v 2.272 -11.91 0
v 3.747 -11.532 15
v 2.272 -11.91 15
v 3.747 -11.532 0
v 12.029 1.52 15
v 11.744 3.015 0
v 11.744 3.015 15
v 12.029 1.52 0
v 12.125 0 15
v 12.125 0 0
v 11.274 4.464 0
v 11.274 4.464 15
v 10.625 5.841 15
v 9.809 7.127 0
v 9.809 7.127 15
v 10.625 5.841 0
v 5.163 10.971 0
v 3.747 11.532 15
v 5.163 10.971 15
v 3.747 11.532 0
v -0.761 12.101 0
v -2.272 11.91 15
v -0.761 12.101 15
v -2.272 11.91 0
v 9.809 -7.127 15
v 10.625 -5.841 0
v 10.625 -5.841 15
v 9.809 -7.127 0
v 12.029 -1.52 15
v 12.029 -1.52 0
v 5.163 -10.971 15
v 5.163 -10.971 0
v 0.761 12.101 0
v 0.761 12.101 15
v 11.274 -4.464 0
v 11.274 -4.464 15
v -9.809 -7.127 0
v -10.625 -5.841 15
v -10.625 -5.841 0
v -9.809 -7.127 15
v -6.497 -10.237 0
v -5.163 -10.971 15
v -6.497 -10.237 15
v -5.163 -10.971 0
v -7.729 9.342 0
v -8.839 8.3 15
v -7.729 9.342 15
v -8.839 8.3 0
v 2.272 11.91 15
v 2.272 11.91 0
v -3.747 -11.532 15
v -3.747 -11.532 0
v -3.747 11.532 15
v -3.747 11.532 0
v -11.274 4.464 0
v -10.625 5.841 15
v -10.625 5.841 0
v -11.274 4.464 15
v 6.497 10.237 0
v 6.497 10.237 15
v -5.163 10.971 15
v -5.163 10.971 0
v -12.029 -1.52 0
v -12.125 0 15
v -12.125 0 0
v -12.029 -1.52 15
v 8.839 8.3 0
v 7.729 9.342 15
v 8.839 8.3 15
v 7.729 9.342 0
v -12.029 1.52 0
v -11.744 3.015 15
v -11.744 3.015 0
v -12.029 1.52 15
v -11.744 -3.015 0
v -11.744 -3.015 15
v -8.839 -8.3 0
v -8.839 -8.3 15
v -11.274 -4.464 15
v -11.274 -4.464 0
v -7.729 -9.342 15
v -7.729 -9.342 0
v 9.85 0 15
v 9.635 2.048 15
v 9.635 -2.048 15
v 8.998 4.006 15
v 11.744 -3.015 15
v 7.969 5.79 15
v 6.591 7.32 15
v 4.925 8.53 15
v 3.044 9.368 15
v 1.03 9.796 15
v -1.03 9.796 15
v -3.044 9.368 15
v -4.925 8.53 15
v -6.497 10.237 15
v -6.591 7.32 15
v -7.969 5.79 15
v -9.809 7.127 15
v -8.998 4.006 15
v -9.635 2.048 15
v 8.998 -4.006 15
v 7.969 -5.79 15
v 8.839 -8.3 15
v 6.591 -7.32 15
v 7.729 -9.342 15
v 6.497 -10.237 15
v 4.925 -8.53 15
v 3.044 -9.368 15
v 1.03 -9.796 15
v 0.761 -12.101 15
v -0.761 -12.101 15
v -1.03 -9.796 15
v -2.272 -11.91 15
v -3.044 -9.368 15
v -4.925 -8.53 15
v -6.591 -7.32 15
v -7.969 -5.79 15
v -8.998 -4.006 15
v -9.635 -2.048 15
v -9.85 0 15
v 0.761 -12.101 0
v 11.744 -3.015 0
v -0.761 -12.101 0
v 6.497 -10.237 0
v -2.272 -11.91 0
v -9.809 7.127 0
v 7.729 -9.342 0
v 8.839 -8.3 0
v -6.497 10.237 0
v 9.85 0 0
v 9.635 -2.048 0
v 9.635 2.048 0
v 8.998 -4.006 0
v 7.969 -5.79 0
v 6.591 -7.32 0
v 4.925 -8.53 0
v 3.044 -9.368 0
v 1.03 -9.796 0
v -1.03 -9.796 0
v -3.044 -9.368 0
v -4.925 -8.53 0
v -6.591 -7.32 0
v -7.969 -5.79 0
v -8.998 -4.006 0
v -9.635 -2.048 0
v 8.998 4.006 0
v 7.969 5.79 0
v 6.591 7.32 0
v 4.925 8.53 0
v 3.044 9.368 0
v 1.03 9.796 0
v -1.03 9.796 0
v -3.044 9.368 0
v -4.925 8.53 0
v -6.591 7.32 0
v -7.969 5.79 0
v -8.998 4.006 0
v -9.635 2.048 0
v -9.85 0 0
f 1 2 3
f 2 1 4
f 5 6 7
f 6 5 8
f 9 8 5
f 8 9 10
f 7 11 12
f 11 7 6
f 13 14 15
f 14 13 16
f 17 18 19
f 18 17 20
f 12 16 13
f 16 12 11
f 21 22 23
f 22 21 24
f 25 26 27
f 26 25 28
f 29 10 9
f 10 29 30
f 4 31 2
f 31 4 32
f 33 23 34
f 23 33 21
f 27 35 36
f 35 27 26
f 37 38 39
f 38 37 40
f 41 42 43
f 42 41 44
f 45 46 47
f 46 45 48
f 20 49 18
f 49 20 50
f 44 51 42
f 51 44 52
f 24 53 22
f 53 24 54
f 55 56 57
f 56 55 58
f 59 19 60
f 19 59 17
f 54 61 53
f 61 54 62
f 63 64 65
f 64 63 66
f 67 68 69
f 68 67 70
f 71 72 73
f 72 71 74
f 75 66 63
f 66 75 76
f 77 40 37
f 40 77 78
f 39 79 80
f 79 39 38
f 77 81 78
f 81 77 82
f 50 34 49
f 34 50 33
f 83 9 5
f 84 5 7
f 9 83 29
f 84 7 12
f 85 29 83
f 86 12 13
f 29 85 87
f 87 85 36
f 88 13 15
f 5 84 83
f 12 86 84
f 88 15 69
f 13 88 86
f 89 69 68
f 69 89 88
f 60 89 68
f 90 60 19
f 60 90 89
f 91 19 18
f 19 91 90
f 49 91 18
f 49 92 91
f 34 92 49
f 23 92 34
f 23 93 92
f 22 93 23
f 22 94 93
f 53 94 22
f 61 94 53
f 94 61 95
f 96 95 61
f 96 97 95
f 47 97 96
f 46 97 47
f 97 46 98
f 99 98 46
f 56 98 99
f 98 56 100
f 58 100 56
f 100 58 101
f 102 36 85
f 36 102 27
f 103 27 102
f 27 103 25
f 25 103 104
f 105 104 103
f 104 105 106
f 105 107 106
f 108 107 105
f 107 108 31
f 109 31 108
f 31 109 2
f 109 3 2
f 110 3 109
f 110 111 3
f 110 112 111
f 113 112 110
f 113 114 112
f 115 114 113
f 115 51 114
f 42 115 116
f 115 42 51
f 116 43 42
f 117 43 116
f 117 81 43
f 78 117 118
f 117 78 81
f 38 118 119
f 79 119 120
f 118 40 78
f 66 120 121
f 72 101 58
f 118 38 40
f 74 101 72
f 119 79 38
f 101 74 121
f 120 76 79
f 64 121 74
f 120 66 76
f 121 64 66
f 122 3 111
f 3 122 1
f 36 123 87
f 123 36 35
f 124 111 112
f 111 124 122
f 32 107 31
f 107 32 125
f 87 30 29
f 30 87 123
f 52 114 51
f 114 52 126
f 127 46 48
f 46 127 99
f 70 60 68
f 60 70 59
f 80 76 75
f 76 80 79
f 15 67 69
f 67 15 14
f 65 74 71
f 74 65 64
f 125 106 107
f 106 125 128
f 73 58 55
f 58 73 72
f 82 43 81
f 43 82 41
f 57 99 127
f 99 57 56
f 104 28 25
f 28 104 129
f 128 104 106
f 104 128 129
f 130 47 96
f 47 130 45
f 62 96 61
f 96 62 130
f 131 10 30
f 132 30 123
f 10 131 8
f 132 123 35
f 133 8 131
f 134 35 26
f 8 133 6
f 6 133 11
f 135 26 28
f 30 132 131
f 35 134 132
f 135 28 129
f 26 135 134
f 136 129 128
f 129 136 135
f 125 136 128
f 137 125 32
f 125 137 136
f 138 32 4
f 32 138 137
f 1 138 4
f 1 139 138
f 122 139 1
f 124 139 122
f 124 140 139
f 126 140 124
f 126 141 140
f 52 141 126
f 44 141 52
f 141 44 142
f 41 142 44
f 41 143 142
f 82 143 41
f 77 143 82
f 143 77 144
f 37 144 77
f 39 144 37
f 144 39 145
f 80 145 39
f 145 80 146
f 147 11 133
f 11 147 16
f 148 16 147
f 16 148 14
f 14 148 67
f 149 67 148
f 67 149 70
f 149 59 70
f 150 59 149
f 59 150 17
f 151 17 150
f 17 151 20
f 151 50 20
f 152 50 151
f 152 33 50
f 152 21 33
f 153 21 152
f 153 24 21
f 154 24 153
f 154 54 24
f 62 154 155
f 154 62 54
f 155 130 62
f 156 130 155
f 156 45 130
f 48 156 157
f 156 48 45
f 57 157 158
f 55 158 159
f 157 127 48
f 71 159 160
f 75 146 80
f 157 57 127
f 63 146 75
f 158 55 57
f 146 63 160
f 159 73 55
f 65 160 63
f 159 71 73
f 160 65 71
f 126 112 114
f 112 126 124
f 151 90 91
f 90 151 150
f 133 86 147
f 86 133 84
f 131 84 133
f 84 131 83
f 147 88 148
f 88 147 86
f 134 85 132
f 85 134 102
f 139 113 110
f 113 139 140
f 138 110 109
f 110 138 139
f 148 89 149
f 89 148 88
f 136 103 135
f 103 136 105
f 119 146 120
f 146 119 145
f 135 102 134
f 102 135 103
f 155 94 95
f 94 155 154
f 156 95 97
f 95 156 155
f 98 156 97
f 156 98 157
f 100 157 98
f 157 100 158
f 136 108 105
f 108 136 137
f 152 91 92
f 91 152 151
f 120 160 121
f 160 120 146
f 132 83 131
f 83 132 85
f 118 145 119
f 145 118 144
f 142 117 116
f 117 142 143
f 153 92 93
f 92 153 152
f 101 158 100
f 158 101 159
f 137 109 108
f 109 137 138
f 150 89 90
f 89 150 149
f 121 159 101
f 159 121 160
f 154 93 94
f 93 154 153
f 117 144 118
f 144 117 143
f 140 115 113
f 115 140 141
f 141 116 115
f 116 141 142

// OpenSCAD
// file: lib.scad
inch = 25.4;
OD = 24.5; // od of lager tube
snug_id_small = 19.7;
insert_diameter = 24.25;

module tube(od, id, h){
  difference(){
    color([1, .3, .6])cylinder(d=od, h=h);
    translate([0, 0, -1])cylinder(d=id, h=h + 2);
  }
}
// main file
include <lib.scad>

od = 19.7;
difference(){
  cylinder(d=24.25, h=15, $fn=50);
  translate([0,0, -1])cylinder(d=od, h=17);
}

/*
difference(){
  cylinder(h=3, d = 4.5, $fn=6);
  translate([0, 0, -.001])cylinder(h=.5, d1=1.5, d2=1, $fn=20);
  translate([0, 0, -1])cylinder(h=5, d=1, $fn=20);
}
*/
